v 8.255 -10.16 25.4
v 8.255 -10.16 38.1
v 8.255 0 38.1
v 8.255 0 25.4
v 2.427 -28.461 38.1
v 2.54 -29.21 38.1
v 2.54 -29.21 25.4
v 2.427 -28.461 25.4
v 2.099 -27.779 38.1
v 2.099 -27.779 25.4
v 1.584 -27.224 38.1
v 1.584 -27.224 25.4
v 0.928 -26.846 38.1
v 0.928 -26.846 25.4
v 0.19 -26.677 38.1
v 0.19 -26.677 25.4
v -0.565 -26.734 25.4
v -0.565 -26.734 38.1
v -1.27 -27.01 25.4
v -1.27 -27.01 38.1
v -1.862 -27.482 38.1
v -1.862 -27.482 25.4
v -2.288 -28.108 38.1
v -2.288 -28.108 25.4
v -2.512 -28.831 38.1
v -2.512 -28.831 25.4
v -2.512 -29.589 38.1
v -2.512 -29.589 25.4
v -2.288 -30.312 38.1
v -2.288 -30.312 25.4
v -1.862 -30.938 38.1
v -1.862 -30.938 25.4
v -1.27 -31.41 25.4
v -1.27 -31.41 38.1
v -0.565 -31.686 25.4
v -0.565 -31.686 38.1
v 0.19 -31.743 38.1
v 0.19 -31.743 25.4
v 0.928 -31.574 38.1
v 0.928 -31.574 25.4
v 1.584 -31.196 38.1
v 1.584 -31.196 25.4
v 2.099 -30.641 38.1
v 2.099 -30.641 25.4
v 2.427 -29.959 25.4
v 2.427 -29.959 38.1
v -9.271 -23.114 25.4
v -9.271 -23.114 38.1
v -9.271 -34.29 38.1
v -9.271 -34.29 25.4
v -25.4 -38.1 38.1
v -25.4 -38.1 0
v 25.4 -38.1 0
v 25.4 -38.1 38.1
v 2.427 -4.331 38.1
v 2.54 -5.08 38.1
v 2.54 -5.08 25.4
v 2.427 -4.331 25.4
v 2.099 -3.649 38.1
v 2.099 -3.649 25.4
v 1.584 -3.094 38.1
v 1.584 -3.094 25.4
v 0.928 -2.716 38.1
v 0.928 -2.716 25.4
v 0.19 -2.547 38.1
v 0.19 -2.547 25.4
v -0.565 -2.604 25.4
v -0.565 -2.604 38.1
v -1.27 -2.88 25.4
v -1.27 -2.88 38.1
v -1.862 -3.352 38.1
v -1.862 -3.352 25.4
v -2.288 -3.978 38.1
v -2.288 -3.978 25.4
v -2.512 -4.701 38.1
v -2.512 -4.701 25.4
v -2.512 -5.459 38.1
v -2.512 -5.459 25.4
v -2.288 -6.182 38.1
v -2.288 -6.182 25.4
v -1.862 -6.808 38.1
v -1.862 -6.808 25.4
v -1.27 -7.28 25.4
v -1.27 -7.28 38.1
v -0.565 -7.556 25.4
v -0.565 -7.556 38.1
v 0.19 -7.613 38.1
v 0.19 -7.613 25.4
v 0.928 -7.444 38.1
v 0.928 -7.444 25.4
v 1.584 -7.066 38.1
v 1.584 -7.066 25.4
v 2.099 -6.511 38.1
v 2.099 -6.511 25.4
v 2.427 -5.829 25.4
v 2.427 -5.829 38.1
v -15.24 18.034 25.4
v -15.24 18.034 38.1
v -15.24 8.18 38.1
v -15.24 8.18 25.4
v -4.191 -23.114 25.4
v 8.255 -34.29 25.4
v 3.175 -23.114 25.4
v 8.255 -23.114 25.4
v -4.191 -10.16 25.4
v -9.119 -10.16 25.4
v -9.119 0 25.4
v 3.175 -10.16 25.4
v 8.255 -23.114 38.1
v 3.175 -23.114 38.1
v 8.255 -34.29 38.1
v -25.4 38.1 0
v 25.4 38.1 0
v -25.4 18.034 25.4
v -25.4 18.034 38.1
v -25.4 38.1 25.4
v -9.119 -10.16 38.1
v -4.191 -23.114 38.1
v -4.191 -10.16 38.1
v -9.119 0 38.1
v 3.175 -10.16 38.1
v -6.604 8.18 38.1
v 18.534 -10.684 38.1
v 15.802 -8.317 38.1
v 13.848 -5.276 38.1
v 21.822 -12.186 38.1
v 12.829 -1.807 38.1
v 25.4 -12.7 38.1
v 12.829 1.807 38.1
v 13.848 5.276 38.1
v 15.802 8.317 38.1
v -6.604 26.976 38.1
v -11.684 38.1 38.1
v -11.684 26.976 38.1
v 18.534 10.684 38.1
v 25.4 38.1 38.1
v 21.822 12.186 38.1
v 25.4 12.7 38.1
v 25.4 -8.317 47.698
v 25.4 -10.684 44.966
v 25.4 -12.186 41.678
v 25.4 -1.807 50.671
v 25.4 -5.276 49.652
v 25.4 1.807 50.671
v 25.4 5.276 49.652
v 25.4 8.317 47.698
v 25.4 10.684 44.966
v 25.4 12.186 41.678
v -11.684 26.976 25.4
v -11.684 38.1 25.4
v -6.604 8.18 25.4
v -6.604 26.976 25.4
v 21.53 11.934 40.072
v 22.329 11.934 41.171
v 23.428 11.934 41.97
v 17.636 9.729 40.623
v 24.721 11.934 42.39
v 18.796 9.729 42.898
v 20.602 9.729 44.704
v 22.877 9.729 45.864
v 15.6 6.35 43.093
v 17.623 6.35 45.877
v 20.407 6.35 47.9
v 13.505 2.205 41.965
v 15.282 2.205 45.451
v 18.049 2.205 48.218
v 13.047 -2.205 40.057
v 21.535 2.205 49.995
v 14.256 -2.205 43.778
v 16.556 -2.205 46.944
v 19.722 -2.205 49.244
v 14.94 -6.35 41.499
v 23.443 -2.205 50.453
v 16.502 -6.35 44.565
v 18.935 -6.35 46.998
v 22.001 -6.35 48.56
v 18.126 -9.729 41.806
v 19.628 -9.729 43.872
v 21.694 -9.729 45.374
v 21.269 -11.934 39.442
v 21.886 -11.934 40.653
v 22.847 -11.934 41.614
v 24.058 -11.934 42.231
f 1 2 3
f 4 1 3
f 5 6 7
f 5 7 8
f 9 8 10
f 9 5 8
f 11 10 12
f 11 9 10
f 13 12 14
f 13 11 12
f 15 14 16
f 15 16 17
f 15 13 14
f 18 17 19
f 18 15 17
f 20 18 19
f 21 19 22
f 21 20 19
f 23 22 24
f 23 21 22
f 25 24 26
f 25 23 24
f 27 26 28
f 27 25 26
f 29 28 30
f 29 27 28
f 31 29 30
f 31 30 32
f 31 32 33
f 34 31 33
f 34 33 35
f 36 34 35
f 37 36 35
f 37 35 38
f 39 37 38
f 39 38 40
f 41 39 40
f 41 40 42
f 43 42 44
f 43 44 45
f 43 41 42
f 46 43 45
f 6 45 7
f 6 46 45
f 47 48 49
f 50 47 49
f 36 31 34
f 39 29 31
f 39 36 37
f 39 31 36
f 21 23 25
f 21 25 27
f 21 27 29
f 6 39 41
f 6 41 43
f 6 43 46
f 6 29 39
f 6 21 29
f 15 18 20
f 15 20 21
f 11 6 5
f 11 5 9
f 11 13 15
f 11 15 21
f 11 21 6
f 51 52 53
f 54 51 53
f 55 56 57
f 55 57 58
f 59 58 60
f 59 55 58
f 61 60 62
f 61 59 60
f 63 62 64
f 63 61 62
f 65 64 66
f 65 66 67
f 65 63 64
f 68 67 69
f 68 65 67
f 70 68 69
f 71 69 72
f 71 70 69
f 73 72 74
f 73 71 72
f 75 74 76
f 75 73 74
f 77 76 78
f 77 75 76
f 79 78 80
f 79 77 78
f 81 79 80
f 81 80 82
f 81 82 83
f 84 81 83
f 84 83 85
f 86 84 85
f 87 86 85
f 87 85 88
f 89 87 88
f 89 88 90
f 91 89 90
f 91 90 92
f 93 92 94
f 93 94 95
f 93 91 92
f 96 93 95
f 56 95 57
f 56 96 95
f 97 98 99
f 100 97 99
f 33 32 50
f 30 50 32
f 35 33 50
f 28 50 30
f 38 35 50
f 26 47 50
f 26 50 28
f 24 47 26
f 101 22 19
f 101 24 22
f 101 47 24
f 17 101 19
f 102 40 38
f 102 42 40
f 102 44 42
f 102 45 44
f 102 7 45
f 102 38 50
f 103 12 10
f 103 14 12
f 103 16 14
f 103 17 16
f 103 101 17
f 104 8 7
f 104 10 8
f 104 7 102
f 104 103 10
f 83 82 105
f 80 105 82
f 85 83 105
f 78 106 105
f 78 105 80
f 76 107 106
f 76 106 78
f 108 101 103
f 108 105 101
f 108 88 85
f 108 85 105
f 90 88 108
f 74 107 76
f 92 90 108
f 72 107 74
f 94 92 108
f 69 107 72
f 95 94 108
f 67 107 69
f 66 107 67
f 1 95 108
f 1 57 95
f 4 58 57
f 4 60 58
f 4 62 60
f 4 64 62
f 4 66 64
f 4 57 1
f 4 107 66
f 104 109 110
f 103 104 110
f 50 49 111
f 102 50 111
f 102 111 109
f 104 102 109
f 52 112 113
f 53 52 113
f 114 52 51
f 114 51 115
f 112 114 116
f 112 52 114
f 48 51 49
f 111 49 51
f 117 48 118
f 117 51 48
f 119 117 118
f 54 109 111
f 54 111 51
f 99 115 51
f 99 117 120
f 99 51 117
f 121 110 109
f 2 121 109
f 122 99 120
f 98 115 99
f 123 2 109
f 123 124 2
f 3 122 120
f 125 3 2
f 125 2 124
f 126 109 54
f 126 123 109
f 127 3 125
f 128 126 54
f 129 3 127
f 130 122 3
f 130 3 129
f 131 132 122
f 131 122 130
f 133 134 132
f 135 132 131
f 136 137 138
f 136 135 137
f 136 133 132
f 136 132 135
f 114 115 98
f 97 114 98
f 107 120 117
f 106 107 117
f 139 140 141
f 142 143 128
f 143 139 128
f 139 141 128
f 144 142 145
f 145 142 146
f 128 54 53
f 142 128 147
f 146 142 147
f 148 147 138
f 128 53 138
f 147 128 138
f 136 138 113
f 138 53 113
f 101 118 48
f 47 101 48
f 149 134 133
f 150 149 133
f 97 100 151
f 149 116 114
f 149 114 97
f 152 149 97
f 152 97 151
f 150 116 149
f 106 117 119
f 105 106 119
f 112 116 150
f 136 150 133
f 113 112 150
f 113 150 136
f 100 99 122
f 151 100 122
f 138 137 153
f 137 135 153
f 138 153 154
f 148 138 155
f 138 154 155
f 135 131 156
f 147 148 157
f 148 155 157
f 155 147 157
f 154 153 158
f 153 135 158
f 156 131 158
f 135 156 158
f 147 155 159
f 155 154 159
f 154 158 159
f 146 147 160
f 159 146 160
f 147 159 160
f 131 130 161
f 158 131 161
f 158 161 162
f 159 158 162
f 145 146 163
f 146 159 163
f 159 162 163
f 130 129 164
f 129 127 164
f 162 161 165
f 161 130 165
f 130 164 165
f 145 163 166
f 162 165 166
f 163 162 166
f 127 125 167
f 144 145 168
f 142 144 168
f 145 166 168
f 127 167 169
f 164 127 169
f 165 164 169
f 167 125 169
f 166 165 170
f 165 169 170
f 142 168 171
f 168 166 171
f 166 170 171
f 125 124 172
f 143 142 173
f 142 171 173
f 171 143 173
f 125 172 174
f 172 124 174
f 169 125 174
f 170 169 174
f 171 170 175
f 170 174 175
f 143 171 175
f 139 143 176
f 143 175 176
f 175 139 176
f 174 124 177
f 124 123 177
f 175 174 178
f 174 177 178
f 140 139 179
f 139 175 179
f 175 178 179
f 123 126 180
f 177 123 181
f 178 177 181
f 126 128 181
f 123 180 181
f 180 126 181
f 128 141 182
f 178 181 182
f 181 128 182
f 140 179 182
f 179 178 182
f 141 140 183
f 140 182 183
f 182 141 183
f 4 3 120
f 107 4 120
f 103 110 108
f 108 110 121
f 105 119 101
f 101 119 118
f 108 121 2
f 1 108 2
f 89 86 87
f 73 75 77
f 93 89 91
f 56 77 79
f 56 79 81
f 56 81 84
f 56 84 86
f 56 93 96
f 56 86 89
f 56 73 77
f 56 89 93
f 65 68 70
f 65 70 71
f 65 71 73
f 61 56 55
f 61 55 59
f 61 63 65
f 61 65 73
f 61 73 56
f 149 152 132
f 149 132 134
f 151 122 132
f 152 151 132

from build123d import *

# Parameters (mm, degrees)
F0_W     = 50.8
F0_H     = 76.2
F1_DEPTH = 38.1
F3_ANGLE = 90
F4_DEPTH = 12.7
F2_R     = 2.54
F5_DEPTH = 12.7


with BuildPart() as f1:
    # F0 (on Top) → F1 (new body)
    with BuildSketch(Plane.XY):
        Rectangle(F0_W, F0_H)
    extrude(amount=F1_DEPTH)

    # F2 (on face) → F3 (revolve)
    with BuildSketch(Plane.XY.offset(38.1)):
        with BuildLine():
            Line((25.4, -12.7), (25.4, 12.7))
            ThreePointArc((25.4, 12.7), (12.7, 0), (25.4, -12.7))
        make_face()
    revolve(axis=Axis((25.4, 0, 38.1), (0, 1, 0)), revolution_arc=F3_ANGLE)

    # F2 (on face) → F4 (cut)
    with BuildSketch(Plane.XY.offset(38.1)):
        Polygon((-11.684, 38.1), (-25.4, 38.1), (-25.4, 18.034), (-15.24, 18.034), (-15.24, 8.1802008182), (-6.604, 8.1802008182), (-6.604, 26.9762008182), (-11.684, 26.9762008182), align=None)
    extrude(amount=-F4_DEPTH, mode=Mode.SUBTRACT)

    # F2 (on face) → F5 (cut)
    with BuildSketch(Plane.XY.offset(38.1)):
        Polygon((-9.271, -23.114), (-9.271, -34.29), (8.255, -34.29), (8.255, -23.114), (3.175, -23.114), (3.175, -10.16), (8.255, -10.16), (8.255, 0), (-9.1186, 0), (-9.1186, -10.16), (-4.191, -10.16), (-4.191, -23.114), align=None)
        with Locations((0, -29.21)):
            Circle(F2_R, mode=Mode.SUBTRACT)
        with Locations((0, -5.08)):
            Circle(F2_R, mode=Mode.SUBTRACT)
    extrude(amount=-F5_DEPTH, mode=Mode.SUBTRACT)


solid = f1.part
